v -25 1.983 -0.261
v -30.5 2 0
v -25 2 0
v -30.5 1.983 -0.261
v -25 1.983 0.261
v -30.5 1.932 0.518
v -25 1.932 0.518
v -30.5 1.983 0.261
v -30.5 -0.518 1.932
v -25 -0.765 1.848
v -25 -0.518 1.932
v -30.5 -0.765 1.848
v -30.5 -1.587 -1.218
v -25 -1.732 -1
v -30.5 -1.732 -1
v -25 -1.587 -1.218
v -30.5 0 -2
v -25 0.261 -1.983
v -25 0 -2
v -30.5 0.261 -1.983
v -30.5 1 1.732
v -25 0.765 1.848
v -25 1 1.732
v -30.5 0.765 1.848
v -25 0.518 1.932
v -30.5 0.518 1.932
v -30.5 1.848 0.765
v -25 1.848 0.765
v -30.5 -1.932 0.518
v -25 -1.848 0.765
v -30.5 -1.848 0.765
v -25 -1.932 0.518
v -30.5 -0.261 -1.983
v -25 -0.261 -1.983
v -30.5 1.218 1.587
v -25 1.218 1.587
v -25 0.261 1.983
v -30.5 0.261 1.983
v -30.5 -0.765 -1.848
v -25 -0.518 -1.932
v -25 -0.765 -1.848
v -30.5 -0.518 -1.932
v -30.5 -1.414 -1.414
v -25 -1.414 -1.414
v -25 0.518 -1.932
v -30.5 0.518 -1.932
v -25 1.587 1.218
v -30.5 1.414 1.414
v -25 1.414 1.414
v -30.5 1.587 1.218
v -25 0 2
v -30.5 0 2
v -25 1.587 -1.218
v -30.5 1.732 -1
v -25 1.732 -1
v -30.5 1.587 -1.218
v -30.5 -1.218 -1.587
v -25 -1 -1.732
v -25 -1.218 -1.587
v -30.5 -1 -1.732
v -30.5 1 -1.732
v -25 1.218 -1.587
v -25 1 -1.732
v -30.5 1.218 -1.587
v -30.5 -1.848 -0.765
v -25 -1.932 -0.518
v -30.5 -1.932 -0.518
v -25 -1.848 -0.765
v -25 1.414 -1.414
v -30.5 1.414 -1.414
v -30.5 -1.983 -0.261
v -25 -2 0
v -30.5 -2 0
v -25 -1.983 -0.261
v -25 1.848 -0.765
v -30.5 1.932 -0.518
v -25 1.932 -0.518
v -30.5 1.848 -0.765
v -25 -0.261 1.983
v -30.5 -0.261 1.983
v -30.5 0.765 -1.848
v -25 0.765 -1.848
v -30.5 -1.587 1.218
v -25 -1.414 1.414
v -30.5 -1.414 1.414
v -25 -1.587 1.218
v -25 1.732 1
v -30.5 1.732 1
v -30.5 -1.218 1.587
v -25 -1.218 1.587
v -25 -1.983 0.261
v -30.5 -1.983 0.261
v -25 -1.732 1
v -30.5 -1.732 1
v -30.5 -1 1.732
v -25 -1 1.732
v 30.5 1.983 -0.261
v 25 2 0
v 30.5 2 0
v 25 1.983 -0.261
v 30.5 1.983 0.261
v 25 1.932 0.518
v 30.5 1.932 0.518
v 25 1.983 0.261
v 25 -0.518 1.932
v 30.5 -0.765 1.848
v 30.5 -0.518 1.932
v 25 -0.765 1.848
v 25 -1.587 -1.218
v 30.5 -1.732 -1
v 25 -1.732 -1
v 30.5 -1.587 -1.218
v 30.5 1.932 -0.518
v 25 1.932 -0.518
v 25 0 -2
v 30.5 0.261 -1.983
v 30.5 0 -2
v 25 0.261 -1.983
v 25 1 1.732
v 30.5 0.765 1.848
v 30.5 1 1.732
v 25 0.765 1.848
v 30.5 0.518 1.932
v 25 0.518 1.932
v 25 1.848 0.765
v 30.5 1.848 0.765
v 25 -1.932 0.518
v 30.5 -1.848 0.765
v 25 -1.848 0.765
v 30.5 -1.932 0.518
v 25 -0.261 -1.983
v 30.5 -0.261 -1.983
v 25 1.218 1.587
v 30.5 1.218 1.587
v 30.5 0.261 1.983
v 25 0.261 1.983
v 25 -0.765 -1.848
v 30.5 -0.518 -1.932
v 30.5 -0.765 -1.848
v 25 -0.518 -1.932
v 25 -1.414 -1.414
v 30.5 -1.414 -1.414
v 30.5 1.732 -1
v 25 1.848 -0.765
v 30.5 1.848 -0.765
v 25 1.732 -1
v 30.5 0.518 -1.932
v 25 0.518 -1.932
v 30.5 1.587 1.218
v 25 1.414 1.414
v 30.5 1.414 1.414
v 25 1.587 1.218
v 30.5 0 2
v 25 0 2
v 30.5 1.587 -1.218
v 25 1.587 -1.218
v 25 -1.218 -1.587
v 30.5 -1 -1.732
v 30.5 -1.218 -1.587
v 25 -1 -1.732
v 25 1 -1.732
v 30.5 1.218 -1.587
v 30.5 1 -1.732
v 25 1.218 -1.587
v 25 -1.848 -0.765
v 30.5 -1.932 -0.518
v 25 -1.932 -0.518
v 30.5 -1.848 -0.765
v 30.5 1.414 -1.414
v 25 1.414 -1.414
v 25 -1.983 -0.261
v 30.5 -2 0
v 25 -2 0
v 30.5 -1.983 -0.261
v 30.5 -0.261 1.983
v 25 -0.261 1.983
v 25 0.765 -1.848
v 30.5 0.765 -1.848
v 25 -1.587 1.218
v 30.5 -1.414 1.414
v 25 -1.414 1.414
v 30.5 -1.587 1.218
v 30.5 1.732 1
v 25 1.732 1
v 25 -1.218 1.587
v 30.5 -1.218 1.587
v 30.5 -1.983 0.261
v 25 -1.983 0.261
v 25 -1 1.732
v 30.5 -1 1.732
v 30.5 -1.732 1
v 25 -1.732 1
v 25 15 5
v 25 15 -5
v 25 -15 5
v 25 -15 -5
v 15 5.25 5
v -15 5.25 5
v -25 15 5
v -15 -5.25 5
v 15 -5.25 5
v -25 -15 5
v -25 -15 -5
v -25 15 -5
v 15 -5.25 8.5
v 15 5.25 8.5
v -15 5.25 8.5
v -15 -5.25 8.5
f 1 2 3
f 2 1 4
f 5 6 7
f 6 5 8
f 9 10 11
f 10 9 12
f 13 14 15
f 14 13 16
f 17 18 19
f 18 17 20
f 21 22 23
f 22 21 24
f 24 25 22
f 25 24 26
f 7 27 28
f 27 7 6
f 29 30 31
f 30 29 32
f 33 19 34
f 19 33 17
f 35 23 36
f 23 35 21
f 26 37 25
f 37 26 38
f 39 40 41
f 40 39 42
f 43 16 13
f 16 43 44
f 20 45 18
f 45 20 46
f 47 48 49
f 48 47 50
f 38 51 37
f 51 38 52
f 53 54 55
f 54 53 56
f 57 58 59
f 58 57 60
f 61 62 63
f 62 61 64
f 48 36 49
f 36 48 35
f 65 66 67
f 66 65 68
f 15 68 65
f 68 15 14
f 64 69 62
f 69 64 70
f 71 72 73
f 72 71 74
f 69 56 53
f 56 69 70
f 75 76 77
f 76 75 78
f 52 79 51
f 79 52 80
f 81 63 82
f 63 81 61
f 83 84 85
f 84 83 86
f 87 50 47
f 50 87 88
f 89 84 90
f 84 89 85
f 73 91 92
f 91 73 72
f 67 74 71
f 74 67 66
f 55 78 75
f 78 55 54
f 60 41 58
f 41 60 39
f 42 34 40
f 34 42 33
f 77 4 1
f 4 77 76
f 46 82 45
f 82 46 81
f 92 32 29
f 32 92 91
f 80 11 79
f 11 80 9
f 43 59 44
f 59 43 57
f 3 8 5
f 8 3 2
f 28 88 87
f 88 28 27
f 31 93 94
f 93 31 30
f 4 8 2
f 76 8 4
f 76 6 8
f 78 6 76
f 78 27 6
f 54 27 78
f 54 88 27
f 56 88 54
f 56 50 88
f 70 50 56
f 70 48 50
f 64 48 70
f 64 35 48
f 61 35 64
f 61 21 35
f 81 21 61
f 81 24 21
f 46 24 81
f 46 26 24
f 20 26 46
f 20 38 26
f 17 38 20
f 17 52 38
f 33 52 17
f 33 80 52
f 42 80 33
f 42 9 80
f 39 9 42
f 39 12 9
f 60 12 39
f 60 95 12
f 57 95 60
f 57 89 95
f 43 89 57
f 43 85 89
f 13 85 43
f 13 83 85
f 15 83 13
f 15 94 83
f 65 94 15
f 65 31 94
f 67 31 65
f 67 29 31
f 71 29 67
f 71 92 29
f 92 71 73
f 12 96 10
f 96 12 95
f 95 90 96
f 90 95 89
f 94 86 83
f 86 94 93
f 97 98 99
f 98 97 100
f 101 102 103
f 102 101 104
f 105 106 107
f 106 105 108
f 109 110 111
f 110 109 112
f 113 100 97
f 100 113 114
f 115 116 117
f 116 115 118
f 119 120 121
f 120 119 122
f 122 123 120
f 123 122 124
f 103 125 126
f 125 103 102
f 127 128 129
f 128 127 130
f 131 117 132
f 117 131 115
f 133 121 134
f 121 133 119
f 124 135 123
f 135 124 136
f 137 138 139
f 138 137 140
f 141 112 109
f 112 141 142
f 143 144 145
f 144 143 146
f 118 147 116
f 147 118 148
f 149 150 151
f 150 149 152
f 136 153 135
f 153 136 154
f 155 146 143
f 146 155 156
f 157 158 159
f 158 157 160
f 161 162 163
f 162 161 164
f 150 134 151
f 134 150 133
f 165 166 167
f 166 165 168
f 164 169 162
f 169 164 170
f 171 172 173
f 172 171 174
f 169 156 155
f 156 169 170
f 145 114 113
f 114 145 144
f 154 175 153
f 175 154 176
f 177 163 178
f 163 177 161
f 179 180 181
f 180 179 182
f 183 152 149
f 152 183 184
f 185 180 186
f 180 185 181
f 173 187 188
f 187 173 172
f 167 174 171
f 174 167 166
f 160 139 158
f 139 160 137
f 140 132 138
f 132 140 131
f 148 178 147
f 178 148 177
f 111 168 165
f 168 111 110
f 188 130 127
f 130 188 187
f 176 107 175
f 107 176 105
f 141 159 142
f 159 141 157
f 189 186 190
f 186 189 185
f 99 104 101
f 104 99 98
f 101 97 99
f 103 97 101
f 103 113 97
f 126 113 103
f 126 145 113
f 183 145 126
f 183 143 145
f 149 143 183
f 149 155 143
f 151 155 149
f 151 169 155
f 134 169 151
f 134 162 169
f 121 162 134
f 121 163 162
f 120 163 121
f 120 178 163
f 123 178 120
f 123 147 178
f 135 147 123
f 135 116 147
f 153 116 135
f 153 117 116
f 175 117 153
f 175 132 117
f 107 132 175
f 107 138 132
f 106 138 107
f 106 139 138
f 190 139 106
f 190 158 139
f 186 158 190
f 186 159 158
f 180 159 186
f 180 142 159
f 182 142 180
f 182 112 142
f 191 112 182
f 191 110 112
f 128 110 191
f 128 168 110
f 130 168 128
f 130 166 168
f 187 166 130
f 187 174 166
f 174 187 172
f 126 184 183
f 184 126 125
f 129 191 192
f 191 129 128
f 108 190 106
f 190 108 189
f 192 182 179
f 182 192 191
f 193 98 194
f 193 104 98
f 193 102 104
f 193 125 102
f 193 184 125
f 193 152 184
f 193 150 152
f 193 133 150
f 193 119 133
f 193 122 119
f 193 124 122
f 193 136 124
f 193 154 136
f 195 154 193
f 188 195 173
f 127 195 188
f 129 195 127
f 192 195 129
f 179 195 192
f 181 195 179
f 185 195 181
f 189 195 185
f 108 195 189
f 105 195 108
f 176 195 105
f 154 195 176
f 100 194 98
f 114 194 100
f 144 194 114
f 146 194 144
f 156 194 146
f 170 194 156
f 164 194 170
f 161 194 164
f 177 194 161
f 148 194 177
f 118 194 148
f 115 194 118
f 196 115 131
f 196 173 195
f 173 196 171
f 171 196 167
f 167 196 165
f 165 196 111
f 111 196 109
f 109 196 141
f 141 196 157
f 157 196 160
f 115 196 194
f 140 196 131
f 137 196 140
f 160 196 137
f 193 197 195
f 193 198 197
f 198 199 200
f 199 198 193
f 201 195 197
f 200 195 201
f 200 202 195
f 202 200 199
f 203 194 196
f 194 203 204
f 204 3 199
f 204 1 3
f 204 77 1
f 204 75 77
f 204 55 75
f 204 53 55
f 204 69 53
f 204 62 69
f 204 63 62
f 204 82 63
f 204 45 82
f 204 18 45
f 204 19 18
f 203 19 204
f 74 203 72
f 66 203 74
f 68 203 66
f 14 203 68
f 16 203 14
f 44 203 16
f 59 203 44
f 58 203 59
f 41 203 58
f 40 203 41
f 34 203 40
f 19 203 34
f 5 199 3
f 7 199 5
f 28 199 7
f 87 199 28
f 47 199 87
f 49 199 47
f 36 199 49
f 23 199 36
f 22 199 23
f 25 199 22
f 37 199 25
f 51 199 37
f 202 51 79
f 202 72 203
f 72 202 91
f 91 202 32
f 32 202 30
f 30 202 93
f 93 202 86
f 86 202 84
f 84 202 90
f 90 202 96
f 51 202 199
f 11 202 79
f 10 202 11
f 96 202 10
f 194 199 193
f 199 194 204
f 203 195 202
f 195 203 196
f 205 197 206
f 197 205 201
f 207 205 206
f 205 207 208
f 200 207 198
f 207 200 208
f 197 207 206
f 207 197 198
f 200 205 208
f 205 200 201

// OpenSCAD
// Parameters
body_length = 50; //[25:100:1]
body_width  = 30; //[15:60:1]
body_height = 10; //[5:20:1]

// Small overlap to guarantee a single connected solid
overlap = 0.5;

// Main Body Module
module main_body() {
  cube([body_length, body_width, body_height], center=true);
}

// Connected component: main body + a top rib + two side bosses (all connected)
module component() {
  rib_h = max(2, body_height*0.4);
  rib_w = body_width * 0.35;
  rib_l = body_length * 0.6;

  boss_r = max(2, min(body_width, body_height) * 0.18);
  boss_h = max(2, body_height * 0.6);

  union() {
    main_body();

    // Rib sits on top of the body with slight overlap
    translate([0, 0, body_height/2 + rib_h/2 - overlap])
      cube([rib_l, rib_w, rib_h], center=true);

    // Two cylindrical bosses on the left/right sides, centered in Z, overlapping into the body
    for (sx = [-1, 1]) {
      translate([sx * (body_length/2 + boss_h/2 - overlap), 0, 0])
        rotate([0, 90, 0])
          cylinder(h=boss_h, r=boss_r, center=true, $fn=48);
    }
  }
}

// Final Model
component();
